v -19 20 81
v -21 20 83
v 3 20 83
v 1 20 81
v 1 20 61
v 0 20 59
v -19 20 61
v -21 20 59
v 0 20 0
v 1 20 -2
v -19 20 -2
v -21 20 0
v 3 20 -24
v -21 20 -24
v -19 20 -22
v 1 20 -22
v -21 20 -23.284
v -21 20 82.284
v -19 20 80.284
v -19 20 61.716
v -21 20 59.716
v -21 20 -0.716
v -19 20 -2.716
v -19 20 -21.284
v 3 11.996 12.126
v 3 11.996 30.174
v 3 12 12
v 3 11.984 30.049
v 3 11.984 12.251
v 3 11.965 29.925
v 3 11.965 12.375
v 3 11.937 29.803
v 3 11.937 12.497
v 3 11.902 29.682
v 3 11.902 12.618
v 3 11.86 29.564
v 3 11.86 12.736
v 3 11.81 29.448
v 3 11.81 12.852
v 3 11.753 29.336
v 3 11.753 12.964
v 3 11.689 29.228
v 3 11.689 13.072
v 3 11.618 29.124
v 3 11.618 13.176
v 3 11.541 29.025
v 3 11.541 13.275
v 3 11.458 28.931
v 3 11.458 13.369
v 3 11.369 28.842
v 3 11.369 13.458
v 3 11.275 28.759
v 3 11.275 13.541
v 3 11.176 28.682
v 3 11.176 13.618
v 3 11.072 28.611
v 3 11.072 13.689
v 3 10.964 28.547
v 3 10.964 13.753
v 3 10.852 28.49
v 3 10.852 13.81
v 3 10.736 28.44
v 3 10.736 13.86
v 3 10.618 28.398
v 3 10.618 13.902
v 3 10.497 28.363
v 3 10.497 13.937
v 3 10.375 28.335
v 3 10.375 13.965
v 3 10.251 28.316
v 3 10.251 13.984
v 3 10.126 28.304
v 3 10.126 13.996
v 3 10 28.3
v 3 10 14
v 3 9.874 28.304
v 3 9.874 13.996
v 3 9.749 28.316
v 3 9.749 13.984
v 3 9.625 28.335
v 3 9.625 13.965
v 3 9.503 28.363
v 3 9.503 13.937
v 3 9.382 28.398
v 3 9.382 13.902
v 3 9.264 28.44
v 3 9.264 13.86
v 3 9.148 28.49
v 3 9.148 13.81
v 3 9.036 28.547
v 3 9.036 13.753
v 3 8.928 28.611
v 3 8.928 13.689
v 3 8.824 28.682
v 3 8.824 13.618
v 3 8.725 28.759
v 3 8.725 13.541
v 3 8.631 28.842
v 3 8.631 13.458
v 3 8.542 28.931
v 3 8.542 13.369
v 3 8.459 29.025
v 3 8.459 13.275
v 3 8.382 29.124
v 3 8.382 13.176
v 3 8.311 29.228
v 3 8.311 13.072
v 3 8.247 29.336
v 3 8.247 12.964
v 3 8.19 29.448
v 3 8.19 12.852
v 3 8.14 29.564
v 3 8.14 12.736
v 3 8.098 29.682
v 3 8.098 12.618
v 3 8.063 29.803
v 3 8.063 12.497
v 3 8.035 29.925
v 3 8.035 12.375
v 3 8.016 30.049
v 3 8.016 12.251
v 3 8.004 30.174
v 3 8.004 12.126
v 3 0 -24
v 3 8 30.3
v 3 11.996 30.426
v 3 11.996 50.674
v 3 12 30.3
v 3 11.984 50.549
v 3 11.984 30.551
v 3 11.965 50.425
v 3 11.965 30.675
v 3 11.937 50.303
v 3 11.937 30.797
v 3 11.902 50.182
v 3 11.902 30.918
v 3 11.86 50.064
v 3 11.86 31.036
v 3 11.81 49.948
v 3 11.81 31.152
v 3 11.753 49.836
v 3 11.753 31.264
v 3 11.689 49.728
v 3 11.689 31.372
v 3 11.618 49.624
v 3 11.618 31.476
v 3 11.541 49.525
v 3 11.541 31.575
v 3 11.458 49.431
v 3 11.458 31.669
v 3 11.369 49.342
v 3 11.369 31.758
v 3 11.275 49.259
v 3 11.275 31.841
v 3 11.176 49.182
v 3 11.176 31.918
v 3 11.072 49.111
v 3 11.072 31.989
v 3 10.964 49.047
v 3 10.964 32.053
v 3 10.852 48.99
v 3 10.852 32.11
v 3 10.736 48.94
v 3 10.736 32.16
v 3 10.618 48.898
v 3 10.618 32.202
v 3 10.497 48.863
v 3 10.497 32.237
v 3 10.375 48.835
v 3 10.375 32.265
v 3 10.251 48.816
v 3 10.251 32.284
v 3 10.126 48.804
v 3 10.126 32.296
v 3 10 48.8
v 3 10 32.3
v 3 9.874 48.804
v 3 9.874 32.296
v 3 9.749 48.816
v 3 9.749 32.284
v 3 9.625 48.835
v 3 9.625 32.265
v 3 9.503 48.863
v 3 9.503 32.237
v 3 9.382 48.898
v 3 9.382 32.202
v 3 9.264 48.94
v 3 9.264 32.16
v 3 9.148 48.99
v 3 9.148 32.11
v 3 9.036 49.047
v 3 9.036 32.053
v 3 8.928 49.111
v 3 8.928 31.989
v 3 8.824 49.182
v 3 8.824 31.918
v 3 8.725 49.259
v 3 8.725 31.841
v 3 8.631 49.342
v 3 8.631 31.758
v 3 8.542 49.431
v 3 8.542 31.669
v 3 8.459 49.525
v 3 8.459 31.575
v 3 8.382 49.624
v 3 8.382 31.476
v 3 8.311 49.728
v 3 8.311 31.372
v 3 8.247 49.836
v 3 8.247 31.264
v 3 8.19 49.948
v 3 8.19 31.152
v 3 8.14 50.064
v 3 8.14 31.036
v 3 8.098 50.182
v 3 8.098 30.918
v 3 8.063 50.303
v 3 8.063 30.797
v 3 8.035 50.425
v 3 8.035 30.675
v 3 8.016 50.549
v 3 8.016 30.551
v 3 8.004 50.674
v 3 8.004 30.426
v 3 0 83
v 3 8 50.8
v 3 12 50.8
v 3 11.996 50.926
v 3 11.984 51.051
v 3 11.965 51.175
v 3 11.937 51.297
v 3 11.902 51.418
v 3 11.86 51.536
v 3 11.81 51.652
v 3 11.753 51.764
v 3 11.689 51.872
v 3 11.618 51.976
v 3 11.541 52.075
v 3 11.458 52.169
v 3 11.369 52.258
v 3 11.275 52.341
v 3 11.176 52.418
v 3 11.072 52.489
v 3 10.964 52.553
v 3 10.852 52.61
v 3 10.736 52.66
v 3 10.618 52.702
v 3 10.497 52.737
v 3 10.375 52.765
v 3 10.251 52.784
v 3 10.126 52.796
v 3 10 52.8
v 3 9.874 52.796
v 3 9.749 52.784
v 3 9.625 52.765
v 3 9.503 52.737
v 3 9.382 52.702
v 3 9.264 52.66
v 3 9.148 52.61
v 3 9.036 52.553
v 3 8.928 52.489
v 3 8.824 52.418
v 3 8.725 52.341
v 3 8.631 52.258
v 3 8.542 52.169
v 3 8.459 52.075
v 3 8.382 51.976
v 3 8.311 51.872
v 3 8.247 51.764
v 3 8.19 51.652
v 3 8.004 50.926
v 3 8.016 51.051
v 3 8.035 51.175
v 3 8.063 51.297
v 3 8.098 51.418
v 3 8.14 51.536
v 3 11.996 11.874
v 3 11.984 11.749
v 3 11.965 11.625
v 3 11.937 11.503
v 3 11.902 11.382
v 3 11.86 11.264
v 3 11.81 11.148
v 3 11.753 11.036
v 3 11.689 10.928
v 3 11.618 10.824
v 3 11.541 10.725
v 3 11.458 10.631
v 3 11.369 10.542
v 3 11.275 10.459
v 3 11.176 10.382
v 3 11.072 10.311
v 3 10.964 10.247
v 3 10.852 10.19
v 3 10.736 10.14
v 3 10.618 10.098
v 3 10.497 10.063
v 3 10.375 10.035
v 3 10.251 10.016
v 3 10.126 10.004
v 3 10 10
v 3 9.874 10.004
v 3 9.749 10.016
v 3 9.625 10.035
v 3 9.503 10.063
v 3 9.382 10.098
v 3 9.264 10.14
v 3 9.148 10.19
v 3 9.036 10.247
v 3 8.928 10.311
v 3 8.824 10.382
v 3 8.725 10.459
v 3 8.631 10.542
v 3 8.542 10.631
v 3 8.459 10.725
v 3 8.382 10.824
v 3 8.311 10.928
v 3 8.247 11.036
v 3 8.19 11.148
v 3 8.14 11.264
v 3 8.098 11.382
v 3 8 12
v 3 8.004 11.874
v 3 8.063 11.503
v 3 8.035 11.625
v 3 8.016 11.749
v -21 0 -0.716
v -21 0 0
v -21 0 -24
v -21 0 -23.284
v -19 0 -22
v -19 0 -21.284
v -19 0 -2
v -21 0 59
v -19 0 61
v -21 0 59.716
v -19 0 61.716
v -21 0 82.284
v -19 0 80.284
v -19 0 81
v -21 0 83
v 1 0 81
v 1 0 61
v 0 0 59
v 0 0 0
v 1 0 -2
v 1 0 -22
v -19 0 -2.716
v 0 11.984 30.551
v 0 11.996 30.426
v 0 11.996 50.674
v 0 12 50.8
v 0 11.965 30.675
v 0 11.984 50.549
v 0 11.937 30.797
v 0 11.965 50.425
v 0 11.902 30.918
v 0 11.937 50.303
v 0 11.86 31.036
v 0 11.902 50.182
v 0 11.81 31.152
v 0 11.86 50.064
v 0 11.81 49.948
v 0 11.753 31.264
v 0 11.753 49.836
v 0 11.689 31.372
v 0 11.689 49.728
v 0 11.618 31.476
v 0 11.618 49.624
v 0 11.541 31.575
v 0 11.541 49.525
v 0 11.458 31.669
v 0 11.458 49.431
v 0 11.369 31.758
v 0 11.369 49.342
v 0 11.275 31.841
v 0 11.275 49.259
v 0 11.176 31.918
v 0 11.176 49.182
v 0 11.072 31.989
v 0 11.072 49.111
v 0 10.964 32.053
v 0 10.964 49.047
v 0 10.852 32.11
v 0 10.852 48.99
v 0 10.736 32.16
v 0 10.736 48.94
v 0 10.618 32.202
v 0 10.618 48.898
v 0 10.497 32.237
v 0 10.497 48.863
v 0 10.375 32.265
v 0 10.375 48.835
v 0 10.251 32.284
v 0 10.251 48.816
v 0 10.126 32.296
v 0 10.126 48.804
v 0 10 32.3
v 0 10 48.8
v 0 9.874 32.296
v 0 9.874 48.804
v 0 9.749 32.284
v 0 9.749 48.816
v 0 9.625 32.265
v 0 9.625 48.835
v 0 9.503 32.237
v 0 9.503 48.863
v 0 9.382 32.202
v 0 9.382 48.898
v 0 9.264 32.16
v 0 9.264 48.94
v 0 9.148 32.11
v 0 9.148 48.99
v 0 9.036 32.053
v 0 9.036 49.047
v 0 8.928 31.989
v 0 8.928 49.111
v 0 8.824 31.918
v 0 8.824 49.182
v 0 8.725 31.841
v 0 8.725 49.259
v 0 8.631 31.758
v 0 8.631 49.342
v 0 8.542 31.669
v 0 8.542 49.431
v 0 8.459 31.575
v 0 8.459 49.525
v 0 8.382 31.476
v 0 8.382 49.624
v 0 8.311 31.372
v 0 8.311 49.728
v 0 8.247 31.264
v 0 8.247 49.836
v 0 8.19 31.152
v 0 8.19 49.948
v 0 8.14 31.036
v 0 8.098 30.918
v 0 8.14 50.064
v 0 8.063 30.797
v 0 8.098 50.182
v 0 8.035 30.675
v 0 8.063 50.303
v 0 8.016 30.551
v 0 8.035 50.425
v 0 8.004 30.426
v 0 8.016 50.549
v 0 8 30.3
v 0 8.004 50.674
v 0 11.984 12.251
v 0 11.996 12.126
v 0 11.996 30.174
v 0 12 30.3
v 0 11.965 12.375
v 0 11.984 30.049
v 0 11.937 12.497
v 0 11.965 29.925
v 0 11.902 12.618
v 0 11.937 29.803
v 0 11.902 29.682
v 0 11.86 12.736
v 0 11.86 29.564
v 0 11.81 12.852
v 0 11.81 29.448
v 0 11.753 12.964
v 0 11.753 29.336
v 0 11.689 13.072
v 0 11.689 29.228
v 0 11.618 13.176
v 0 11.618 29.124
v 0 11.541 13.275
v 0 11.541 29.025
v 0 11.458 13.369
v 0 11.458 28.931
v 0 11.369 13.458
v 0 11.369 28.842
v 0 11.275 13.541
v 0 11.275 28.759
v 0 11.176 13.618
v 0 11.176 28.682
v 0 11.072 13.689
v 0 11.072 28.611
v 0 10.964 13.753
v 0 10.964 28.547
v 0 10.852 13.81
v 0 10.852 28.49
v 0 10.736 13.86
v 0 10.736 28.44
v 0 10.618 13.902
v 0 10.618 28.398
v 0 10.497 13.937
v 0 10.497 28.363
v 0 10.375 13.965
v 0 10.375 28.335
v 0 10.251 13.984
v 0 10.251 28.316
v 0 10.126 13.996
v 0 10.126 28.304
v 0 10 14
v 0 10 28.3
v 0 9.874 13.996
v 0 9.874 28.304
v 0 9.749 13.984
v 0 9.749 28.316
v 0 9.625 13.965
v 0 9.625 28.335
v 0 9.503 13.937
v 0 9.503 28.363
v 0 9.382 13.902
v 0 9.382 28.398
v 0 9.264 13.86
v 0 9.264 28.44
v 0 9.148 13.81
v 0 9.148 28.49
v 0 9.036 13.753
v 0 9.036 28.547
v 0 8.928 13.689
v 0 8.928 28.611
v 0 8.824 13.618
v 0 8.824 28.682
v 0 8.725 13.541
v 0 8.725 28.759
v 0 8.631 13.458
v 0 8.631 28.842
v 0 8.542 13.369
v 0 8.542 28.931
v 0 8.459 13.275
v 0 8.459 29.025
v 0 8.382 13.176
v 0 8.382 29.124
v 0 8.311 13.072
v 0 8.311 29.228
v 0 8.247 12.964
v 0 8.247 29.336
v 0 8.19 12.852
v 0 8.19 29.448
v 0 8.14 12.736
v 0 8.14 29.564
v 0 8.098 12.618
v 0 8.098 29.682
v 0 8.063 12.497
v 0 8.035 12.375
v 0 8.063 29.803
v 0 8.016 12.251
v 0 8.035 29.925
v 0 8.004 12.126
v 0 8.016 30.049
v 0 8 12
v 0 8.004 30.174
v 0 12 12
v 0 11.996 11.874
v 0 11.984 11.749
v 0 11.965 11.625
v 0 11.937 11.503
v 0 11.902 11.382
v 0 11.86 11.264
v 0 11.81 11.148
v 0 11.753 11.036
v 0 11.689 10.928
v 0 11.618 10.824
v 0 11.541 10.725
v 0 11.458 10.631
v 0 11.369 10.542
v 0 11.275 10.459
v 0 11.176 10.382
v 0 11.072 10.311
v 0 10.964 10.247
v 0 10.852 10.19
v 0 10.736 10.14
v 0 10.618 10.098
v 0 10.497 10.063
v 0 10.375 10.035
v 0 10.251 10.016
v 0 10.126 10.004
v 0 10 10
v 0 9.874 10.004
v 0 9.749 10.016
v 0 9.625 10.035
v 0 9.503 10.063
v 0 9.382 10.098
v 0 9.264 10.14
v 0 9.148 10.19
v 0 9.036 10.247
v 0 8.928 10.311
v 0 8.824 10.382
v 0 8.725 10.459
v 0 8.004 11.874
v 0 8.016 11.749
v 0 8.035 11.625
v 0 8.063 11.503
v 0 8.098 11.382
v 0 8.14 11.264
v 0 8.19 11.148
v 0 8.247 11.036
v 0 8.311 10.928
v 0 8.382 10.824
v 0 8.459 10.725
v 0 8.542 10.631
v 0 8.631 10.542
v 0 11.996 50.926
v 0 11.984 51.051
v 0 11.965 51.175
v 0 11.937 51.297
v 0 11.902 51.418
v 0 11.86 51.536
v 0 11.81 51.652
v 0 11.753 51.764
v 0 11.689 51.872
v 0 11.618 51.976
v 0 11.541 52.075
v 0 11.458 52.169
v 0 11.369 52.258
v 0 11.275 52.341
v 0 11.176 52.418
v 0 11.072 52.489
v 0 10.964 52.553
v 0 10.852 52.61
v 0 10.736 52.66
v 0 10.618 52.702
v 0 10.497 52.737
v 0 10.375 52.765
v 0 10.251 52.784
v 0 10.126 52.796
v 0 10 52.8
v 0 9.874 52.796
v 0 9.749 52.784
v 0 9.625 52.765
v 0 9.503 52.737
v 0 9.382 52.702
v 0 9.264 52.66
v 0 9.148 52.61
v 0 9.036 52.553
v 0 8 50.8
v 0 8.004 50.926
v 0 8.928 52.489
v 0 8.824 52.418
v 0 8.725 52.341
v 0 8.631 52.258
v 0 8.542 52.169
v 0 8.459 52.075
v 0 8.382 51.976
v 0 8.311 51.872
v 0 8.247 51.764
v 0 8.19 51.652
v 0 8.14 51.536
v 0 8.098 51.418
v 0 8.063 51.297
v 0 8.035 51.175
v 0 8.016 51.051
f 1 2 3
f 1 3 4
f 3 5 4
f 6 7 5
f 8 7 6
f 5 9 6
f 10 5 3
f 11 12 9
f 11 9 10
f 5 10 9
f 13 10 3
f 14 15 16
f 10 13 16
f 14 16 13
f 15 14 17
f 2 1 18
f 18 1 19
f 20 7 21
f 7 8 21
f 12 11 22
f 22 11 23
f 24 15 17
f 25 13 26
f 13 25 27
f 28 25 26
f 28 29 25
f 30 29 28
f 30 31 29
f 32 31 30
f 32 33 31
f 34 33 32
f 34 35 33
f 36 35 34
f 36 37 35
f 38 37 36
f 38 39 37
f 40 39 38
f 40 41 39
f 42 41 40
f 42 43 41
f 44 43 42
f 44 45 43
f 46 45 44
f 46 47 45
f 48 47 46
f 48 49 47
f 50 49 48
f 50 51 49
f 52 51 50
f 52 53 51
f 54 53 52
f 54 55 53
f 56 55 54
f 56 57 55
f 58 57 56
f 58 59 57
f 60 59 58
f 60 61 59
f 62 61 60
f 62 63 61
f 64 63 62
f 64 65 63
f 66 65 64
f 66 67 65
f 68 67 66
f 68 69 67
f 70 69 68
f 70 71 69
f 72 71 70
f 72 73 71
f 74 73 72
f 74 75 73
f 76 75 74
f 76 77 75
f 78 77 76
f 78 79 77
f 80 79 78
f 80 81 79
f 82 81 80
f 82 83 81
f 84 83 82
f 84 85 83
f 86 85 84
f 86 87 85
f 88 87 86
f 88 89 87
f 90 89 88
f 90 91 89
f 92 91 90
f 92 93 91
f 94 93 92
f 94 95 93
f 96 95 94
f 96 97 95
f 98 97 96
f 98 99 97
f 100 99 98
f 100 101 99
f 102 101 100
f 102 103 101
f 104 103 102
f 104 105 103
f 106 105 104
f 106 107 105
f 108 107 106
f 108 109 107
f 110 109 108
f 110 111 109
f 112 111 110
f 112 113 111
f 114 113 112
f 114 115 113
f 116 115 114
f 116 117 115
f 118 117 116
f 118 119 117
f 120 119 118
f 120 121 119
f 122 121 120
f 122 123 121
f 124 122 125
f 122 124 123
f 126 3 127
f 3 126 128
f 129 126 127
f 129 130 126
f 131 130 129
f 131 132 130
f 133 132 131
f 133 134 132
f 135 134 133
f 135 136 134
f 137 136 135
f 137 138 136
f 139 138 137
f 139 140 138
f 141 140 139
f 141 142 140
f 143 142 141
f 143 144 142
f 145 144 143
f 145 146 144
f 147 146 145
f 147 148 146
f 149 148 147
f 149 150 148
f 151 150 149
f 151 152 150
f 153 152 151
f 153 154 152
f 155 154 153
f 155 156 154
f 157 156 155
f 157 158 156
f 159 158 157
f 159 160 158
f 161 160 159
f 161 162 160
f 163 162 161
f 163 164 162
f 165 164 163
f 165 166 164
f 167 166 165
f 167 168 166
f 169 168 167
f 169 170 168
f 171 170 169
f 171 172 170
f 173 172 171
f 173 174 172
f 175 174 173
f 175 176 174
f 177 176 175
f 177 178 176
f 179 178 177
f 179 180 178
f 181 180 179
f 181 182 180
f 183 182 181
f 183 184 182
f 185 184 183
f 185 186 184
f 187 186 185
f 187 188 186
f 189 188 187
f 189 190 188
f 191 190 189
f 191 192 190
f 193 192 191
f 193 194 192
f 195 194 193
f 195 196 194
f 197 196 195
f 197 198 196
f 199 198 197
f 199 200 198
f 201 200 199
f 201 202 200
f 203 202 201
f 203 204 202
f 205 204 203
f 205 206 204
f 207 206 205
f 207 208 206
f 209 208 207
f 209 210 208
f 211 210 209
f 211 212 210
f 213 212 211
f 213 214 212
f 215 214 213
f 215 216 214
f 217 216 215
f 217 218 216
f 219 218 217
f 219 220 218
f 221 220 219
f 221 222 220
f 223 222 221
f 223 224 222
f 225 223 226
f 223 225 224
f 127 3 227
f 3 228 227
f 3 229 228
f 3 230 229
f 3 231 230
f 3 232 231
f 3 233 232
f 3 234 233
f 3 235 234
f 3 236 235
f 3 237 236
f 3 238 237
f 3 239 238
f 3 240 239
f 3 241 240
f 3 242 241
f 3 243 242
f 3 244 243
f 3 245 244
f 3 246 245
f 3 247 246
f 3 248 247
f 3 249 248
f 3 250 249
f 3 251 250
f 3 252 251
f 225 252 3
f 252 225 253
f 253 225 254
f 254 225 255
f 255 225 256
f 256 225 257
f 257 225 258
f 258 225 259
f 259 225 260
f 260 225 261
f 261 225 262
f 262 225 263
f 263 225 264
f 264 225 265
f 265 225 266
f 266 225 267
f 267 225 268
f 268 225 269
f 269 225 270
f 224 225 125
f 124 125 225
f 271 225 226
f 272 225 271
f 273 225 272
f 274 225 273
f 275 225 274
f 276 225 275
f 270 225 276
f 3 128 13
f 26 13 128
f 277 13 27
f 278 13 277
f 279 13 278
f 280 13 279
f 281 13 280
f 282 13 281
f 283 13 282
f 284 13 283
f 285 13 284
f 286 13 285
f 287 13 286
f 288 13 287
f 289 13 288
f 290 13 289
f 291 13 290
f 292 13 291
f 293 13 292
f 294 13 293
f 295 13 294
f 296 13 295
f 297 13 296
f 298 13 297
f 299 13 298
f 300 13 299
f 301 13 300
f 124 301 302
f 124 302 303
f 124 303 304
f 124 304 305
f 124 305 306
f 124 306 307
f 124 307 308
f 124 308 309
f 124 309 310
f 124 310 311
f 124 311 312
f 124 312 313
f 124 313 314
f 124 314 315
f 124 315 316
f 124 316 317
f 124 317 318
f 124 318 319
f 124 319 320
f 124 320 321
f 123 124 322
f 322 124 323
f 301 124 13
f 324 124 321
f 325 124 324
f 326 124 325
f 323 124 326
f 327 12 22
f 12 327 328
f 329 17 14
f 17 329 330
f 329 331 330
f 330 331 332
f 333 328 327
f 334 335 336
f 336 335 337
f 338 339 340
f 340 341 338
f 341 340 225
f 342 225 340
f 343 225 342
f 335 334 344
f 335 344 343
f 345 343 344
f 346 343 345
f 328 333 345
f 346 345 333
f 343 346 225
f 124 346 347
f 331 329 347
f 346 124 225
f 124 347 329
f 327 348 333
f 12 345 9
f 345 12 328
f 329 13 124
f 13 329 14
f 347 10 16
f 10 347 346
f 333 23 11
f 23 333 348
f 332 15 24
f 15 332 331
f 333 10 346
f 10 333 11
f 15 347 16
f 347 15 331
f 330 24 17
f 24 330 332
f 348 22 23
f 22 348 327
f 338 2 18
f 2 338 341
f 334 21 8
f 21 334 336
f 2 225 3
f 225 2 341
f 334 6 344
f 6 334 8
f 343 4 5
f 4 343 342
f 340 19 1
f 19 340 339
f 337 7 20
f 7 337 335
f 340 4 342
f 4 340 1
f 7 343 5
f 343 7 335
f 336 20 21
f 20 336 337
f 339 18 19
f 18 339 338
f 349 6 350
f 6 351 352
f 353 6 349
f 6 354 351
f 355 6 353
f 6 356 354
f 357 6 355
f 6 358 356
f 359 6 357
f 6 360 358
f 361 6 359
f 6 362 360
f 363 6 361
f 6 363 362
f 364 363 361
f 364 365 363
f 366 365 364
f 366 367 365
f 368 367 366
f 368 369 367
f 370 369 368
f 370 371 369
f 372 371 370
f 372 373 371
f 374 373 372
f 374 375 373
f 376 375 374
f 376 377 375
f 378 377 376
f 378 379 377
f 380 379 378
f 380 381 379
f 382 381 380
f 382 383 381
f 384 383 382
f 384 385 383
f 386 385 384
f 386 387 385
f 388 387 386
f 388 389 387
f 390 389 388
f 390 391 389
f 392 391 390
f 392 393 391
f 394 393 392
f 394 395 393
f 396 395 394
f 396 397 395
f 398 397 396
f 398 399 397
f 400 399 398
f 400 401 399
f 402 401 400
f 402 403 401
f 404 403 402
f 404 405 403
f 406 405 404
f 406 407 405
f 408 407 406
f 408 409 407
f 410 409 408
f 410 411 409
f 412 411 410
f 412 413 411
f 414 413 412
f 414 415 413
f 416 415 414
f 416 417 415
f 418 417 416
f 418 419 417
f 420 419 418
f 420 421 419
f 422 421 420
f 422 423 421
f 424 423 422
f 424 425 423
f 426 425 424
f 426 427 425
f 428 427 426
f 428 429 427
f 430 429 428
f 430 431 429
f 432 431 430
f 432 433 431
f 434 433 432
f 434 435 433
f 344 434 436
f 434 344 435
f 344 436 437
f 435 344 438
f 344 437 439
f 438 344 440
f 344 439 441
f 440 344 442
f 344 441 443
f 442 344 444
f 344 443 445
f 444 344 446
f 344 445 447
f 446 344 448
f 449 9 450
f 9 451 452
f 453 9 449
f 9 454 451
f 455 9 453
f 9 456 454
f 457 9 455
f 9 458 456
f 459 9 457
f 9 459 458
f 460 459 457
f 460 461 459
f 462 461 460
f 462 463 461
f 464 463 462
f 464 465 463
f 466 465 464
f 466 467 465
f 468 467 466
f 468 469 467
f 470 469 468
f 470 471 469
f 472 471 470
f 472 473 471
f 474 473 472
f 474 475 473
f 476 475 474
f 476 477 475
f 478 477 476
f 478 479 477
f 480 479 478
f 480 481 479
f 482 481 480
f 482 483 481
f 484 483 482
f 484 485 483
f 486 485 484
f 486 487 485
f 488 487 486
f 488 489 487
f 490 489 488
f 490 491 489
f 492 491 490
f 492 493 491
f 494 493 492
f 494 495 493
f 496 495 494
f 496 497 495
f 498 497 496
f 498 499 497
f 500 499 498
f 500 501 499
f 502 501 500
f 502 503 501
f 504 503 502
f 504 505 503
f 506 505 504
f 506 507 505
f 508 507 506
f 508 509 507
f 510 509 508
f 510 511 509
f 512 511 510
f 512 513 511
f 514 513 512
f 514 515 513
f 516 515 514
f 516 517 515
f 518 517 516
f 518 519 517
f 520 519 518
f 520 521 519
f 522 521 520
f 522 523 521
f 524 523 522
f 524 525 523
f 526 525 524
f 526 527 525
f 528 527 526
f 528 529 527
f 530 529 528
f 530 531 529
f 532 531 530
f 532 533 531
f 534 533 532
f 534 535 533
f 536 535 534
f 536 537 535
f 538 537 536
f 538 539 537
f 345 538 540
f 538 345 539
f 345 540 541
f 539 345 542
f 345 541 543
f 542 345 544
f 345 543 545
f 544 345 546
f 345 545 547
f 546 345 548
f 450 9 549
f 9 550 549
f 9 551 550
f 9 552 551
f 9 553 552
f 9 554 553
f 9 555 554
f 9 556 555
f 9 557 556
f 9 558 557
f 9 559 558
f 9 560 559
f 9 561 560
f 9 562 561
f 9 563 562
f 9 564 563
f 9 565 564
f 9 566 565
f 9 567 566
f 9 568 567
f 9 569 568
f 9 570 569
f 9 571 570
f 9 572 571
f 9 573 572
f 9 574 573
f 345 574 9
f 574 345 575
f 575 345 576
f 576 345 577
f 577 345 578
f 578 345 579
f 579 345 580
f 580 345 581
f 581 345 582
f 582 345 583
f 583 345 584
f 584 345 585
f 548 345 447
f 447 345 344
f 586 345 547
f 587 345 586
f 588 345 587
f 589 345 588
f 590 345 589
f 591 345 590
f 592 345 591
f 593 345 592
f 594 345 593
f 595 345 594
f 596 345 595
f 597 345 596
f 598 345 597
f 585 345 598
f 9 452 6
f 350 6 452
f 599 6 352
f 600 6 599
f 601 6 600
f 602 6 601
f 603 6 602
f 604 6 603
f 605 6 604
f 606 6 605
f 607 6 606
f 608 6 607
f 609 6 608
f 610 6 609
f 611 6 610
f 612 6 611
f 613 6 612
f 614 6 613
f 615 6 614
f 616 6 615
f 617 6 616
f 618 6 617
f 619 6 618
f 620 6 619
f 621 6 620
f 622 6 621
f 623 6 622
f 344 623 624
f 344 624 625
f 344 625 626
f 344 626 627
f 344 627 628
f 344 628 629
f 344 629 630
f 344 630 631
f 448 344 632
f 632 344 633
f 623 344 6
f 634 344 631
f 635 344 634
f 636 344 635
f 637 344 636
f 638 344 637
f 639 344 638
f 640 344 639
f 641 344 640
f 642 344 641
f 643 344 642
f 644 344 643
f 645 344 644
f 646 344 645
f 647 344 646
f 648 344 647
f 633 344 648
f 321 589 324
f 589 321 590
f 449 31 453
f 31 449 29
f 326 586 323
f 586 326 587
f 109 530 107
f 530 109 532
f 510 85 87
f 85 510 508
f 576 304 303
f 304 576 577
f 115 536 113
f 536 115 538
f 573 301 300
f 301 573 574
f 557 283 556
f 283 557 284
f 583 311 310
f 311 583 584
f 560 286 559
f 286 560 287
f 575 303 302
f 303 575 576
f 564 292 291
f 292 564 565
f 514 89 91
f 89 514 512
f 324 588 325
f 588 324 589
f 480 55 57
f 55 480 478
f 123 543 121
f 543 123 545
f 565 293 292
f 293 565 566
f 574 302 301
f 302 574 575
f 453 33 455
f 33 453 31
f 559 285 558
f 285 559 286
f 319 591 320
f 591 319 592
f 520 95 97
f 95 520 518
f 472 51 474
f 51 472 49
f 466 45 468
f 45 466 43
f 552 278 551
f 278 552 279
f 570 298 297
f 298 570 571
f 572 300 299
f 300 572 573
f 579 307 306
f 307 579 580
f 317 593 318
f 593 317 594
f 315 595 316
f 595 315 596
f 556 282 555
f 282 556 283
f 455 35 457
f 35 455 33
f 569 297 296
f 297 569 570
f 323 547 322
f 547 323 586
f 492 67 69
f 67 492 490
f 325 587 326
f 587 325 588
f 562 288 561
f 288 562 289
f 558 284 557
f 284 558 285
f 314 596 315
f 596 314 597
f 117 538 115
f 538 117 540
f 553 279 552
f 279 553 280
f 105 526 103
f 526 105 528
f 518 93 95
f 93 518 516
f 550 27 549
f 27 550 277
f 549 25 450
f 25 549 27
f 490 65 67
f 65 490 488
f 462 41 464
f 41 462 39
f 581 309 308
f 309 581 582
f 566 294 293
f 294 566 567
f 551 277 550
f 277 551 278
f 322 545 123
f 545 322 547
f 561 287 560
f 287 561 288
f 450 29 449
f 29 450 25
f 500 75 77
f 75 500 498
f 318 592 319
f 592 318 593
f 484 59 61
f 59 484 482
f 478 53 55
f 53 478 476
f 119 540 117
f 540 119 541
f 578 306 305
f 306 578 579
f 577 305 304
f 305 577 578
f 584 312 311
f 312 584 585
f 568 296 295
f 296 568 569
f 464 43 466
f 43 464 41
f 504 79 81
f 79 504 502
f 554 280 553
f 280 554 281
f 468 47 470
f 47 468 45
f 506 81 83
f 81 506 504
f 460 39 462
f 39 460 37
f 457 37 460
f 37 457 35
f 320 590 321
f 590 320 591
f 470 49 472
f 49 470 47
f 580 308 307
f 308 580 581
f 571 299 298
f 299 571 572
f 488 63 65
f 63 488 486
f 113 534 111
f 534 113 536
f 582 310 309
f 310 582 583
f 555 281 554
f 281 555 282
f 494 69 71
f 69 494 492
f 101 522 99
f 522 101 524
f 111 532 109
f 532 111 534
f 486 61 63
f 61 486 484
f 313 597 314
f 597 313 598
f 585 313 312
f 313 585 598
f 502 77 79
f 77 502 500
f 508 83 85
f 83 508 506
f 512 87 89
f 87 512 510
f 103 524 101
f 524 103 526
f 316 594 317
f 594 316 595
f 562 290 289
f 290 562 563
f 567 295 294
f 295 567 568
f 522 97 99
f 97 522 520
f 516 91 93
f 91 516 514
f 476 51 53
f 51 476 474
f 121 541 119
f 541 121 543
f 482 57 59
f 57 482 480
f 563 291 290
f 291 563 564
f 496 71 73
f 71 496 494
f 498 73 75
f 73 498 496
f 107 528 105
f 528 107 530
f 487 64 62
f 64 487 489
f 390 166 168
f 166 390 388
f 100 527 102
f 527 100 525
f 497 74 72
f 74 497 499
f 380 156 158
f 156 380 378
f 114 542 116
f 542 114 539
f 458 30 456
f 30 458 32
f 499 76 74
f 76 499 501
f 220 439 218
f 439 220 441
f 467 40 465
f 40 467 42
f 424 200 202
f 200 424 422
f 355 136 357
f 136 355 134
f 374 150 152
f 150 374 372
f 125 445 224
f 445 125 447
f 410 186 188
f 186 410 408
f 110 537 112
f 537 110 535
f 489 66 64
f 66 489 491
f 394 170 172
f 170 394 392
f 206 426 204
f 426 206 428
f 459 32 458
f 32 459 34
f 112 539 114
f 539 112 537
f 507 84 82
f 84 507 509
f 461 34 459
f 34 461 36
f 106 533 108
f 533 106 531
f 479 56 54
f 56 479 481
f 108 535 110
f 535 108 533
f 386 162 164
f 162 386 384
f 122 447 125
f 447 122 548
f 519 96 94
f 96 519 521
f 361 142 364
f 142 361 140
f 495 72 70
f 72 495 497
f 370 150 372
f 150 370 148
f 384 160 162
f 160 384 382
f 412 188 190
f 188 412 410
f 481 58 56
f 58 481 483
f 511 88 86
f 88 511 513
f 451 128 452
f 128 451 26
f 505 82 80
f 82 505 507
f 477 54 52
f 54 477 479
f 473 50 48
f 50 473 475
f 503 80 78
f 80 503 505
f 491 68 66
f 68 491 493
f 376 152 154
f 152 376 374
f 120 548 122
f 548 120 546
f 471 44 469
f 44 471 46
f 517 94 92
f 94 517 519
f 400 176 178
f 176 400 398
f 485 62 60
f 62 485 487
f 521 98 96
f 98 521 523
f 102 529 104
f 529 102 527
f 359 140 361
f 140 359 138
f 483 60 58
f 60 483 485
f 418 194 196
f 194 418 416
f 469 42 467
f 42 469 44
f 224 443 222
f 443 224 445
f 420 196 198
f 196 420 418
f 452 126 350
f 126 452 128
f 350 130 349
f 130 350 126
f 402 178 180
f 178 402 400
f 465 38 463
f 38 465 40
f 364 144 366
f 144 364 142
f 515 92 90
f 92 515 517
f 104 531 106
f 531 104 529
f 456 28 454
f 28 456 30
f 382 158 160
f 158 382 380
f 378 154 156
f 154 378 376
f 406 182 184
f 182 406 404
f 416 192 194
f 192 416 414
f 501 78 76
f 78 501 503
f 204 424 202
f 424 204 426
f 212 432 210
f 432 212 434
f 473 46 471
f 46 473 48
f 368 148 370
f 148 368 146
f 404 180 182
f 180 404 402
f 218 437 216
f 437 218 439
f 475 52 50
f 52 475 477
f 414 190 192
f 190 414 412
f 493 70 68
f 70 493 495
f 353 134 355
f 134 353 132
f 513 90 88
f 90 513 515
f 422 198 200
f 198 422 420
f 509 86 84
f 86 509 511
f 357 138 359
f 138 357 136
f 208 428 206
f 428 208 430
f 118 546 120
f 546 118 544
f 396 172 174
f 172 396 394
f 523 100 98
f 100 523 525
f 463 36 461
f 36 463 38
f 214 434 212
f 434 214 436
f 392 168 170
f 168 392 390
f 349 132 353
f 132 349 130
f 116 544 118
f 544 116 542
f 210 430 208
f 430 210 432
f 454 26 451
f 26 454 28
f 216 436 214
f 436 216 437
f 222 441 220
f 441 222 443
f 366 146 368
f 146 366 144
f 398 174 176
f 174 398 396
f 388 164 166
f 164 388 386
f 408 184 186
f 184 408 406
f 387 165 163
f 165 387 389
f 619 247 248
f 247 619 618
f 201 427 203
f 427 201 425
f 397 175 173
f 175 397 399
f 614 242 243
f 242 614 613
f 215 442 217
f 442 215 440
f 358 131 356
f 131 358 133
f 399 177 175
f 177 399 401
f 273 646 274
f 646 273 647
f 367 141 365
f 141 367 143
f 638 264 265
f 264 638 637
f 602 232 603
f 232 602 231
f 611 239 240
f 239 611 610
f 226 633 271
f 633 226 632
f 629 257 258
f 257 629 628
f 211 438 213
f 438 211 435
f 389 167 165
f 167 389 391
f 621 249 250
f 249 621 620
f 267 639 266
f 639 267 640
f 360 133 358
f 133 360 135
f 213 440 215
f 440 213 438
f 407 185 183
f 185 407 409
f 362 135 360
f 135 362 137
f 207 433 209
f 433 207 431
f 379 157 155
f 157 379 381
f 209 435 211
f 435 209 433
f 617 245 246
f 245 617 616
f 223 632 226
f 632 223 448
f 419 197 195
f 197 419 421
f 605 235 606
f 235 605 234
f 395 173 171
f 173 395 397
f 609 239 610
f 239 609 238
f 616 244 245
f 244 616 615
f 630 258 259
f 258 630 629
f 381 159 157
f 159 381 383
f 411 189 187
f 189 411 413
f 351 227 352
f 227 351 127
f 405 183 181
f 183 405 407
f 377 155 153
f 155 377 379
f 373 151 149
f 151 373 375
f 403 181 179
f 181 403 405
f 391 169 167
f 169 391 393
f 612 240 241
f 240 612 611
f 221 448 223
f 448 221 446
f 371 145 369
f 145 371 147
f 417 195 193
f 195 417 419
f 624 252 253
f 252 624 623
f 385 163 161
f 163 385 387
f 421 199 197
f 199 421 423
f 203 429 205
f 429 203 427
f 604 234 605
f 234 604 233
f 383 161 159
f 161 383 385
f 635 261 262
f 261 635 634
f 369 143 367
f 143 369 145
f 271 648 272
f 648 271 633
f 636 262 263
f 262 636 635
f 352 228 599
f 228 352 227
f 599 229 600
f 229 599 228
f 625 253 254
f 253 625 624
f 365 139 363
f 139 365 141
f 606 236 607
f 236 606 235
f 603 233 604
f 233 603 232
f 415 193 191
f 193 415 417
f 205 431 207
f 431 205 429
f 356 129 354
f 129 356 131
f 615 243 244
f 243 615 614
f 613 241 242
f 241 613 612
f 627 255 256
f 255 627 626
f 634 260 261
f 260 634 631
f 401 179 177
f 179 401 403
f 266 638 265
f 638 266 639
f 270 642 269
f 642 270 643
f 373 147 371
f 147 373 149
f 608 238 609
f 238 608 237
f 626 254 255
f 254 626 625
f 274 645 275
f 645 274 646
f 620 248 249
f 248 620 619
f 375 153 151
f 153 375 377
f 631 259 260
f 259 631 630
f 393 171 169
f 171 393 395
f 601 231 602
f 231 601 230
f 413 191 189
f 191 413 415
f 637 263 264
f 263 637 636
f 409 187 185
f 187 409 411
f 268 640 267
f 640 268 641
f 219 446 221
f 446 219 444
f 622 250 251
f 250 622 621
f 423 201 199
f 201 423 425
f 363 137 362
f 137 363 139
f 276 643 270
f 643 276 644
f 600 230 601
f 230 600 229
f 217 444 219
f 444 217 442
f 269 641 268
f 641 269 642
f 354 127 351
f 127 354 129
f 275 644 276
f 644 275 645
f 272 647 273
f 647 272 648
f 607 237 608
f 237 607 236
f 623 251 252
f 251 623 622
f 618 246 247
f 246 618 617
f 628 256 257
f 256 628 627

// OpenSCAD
// file: library.scad
module screwHole()
{
	cylinder(d=4, h=10, $fn=100);
}

module tabFemale()
{
	difference()
	{
		cube([10, 10, 4]);
		translate([5, 5, -3]) screwHole();
		translate([5, 5, -1])	cylinder(d=6.25, h=3, $fn=100);
	}
}

module tabMale()
{
	difference()
	{
		union()
		{
			cube([10, 10, 4]);
			translate([5, 5, 4])	cylinder(d=5.75, h=2, $fn=100);
		}
		translate([5, 5, -3]) screwHole();
	}
}


module switchOutline()
{
	cube([47.5, 18.5, 30]);
	translate([0,-1,1.25])	cube([47.5, 1, 27.5]);
}

module barConnector()
{
	difference()
	{
		color("blue") cube(size=[20,24,24]);
		translate([-2,2,2]) cube(size=[25, 20, 20]);
		color("Navy")  translate([-3, 12, -17]) rotate([45,0,0]) cube([25, 20, 20]);
	}

}
// main file
include <library.scad>
start=12;
difference()
{
union()
{
rotate([90,0,90]) translate([0,-24,-21]) barConnector();

rotate([90,0,90]) translate([0,59,-21]) barConnector();

cube([3, 20, 59]);
}


color("orange") translate([-2,10,start]) rotate([0, 90,0]) screwHole();
color("orange") translate([-2,10,start + 18.3]) rotate([0, 90,0]) screwHole();
color("orange") translate([-2,10,start + 18.3 + 20.5]) rotate([0, 90,0]) screwHole();
}

/*
Hole 1 to Hole 2 = 18.3
Hole 2 to Hole 3 = 20.5

Edge to Hole 1 = 17.2
Edge to Hole 3 = 11.5

Height of cover 58.25
*/
